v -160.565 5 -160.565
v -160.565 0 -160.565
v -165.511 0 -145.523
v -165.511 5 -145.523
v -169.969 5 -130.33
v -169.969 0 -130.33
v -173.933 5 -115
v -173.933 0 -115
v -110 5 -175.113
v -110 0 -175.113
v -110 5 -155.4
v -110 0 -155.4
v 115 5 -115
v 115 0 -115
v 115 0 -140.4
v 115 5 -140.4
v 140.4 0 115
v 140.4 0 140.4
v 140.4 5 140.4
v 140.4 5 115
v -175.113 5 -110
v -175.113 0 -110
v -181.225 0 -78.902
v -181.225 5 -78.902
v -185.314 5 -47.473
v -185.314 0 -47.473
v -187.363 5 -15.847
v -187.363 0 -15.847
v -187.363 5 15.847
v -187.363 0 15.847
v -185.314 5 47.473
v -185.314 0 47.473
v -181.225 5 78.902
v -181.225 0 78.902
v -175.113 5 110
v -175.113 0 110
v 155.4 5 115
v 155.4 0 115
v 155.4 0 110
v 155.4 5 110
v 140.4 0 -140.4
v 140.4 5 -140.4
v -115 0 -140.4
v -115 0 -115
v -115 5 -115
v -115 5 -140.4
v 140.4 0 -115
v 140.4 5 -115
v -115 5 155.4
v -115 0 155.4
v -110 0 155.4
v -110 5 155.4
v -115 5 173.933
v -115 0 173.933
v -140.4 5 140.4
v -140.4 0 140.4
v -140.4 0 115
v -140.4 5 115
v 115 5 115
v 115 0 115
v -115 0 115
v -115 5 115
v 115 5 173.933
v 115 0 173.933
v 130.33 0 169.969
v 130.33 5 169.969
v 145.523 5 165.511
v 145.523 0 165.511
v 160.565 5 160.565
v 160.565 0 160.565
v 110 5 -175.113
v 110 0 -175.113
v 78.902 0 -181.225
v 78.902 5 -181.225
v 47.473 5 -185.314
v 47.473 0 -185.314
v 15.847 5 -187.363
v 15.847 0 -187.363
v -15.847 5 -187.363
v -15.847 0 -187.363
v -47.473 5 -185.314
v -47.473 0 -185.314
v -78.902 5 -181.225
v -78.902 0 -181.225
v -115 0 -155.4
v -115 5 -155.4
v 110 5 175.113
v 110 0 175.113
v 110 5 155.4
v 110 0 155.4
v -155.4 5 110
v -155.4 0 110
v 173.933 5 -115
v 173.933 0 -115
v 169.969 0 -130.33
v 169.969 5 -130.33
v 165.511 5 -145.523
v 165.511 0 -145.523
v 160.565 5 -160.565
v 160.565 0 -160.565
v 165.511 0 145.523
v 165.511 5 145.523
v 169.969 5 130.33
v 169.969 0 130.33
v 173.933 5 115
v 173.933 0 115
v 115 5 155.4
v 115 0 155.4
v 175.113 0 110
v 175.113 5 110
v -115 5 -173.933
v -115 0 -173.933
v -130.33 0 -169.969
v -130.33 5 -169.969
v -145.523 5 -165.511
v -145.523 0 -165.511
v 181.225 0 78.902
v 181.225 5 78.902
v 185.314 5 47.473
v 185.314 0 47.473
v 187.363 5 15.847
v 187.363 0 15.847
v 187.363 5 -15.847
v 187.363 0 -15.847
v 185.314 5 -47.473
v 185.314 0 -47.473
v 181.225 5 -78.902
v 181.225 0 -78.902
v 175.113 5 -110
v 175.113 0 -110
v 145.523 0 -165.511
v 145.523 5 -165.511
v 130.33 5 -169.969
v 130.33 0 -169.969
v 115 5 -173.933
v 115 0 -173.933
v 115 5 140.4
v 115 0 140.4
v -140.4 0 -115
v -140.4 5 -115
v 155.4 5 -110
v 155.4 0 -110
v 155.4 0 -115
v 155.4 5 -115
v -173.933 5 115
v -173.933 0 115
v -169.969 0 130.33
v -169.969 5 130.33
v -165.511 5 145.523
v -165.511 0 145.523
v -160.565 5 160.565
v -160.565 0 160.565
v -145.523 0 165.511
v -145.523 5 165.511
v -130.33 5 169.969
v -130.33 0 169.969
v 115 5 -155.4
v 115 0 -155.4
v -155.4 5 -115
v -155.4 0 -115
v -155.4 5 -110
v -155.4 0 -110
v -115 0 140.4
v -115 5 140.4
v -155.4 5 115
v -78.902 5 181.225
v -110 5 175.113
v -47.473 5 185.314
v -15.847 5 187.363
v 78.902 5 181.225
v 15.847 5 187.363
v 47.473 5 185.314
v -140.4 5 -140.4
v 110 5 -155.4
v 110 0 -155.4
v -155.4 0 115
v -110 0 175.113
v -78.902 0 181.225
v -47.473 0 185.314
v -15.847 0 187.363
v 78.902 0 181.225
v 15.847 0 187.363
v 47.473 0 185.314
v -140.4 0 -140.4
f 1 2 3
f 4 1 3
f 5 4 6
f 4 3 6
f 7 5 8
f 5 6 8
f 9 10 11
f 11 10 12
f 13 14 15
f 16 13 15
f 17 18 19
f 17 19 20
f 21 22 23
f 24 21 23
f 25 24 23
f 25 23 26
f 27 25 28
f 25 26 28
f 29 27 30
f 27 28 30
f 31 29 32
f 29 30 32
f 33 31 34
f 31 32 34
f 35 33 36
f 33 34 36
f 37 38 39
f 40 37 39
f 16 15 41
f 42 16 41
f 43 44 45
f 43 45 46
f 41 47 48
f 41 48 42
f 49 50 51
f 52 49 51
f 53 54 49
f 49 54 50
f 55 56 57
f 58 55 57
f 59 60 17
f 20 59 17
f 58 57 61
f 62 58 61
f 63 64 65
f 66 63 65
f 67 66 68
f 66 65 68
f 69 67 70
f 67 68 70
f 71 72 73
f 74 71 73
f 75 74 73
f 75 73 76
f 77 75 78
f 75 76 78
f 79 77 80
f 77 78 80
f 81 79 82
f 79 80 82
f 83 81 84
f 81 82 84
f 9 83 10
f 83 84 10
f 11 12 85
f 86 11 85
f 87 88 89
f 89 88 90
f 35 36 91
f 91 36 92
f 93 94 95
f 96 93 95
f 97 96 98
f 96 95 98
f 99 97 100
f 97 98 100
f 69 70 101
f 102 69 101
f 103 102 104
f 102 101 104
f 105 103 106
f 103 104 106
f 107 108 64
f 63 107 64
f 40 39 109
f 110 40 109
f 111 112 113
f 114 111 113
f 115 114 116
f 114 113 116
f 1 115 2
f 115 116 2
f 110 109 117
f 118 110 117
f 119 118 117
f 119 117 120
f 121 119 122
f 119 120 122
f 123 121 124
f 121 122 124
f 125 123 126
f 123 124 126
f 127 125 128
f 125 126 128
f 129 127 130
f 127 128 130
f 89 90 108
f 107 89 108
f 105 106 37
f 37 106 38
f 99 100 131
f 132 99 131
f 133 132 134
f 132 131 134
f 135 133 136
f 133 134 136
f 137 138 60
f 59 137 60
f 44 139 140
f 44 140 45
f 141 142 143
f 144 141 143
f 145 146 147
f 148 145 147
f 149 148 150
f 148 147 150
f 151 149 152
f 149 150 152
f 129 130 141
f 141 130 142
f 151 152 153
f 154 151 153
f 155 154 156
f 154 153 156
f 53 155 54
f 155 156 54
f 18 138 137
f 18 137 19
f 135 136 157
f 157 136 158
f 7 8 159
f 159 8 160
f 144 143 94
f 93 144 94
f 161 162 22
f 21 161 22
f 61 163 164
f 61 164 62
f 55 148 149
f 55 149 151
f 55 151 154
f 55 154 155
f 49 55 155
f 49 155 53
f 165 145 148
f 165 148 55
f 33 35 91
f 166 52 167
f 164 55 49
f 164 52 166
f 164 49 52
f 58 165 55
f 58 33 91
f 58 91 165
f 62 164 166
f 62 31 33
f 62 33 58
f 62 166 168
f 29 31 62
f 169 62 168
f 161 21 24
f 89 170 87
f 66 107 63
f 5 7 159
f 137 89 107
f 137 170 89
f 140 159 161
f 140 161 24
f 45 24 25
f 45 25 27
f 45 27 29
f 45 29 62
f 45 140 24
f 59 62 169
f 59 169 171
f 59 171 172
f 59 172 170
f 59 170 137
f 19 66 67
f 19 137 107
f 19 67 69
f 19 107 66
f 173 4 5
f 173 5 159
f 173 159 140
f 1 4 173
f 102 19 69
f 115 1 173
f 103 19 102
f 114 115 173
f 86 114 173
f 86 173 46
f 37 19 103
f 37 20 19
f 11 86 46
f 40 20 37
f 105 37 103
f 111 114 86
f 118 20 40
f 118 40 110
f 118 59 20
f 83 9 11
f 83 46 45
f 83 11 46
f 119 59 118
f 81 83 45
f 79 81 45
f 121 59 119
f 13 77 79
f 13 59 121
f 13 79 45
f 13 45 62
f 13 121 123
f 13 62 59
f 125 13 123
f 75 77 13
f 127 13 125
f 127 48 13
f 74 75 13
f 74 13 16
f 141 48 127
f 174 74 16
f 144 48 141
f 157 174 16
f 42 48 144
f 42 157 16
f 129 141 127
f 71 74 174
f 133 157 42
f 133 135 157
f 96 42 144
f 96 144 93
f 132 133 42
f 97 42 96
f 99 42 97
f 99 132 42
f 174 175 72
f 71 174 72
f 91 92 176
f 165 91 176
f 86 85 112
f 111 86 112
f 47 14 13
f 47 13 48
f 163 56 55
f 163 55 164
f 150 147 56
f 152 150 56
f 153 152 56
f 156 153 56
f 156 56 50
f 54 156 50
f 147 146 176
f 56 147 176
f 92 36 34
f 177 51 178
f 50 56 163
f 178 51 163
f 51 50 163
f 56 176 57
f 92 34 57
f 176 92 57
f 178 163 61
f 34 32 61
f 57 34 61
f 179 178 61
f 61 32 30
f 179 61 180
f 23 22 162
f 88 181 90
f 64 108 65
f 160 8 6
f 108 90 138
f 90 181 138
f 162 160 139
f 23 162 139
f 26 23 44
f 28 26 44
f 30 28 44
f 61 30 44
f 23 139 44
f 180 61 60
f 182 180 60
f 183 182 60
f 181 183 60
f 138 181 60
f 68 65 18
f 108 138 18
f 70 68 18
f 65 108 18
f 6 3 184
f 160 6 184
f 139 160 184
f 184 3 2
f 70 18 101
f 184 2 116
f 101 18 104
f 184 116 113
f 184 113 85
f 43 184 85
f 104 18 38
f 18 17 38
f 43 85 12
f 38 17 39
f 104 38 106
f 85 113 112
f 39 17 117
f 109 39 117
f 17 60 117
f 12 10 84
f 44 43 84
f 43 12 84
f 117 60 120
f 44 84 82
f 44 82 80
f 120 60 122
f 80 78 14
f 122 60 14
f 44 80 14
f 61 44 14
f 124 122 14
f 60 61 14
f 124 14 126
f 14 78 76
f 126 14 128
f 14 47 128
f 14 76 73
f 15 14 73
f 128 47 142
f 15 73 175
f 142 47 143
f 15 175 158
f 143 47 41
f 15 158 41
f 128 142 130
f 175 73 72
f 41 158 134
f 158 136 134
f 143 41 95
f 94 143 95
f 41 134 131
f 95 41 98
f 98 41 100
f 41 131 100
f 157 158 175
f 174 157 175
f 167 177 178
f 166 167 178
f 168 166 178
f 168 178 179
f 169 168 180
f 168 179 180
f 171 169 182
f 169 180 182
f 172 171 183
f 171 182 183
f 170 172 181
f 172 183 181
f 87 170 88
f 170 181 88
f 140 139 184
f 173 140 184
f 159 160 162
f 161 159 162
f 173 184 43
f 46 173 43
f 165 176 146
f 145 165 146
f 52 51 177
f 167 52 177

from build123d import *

# Parameters (mm, degrees)
SKETCH1_W           = 25.4
SKETCH1_H           = 25.4
BOSS_EXTRUDE1_DEPTH = 5


with BuildPart() as part:
    # Sketch1 → Boss-Extrude1 (new body)
    with BuildSketch(Plane(origin=(0, 0, 0), x_dir=(1, 0, 0), z_dir=(0, 1, 0))):
        with BuildLine():
            Line((110, 155.4), (110, 175.11258305))
            ThreePointArc((110, 175.11258305), (0, 187.619127597), (-110, 175.11258305))
            Line((-110, 175.11258305), (-110, 155.4))
            Line((-110, 155.4), (-115, 155.4))
            Line((-115, 155.4), (-115, 173.933099678))
            ThreePointArc((-115, 173.933099678), (-137.944531709, 167.801332887), (-160.565, 160.565))
            ThreePointArc((-160.565, 160.565), (-167.801332887, 137.944531709), (-173.933099678, 115))
            Line((-173.933099678, 115), (-155.4, 115))
            Line((-155.4, 115), (-155.4, 110))
            Line((-155.4, 110), (-175.11258305, 110))
            ThreePointArc((-175.11258305, 110), (-187.619127597, 0), (-175.11258305, -110))
            Line((-175.11258305, -110), (-155.4, -110))
            Line((-155.4, -110), (-155.4, -115))
            Line((-155.4, -115), (-173.933099678, -115))
            ThreePointArc((-173.933099678, -115), (-167.801332887, -137.944531709), (-160.565, -160.565))
            ThreePointArc((-160.565, -160.565), (-137.944531709, -167.801332887), (-115, -173.933099678))
            Line((-115, -173.933099678), (-115, -155.4))
            Line((-115, -155.4), (-110, -155.4))
            Line((-110, -155.4), (-110, -175.11258305))
            ThreePointArc((-110, -175.11258305), (0, -187.619127597), (110, -175.11258305))
            Line((110, -175.11258305), (110, -155.4))
            Line((110, -155.4), (115, -155.4))
            Line((115, -155.4), (115, -173.933099678))
            ThreePointArc((115, -173.933099678), (137.944531709, -167.801332887), (160.565, -160.565))
            ThreePointArc((160.565, -160.565), (167.801332887, -137.944531709), (173.933099678, -115))
            Line((173.933099678, -115), (155.4, -115))
            Line((155.4, -115), (155.4, -110))
            Line((155.4, -110), (175.11258305, -110))
            ThreePointArc((175.11258305, -110), (187.619127597, 0), (175.11258305, 110))
            Line((175.11258305, 110), (155.4, 110))
            Line((155.4, 110), (155.4, 115))
            Line((155.4, 115), (173.933099678, 115))
            ThreePointArc((173.933099678, 115), (167.801332887, 137.944531709), (160.565, 160.565))
            ThreePointArc((160.565, 160.565), (137.944531709, 167.801332887), (115, 173.933099678))
            Line((115, 173.933099678), (115, 155.4))
            Line((115, 155.4), (110, 155.4))
        make_face()
        with Locations((-127.7, 127.7)):
            Rectangle(SKETCH1_W, SKETCH1_H, mode=Mode.SUBTRACT)
        with Locations((127.7, 127.7)):
            Rectangle(SKETCH1_W, SKETCH1_H, mode=Mode.SUBTRACT)
        with Locations((127.7, -127.7)):
            Rectangle(SKETCH1_W, SKETCH1_H, mode=Mode.SUBTRACT)
        with Locations((-127.7, -127.7)):
            Rectangle(SKETCH1_W, SKETCH1_H, mode=Mode.SUBTRACT)
    extrude(amount=BOSS_EXTRUDE1_DEPTH)


solid = part.part
